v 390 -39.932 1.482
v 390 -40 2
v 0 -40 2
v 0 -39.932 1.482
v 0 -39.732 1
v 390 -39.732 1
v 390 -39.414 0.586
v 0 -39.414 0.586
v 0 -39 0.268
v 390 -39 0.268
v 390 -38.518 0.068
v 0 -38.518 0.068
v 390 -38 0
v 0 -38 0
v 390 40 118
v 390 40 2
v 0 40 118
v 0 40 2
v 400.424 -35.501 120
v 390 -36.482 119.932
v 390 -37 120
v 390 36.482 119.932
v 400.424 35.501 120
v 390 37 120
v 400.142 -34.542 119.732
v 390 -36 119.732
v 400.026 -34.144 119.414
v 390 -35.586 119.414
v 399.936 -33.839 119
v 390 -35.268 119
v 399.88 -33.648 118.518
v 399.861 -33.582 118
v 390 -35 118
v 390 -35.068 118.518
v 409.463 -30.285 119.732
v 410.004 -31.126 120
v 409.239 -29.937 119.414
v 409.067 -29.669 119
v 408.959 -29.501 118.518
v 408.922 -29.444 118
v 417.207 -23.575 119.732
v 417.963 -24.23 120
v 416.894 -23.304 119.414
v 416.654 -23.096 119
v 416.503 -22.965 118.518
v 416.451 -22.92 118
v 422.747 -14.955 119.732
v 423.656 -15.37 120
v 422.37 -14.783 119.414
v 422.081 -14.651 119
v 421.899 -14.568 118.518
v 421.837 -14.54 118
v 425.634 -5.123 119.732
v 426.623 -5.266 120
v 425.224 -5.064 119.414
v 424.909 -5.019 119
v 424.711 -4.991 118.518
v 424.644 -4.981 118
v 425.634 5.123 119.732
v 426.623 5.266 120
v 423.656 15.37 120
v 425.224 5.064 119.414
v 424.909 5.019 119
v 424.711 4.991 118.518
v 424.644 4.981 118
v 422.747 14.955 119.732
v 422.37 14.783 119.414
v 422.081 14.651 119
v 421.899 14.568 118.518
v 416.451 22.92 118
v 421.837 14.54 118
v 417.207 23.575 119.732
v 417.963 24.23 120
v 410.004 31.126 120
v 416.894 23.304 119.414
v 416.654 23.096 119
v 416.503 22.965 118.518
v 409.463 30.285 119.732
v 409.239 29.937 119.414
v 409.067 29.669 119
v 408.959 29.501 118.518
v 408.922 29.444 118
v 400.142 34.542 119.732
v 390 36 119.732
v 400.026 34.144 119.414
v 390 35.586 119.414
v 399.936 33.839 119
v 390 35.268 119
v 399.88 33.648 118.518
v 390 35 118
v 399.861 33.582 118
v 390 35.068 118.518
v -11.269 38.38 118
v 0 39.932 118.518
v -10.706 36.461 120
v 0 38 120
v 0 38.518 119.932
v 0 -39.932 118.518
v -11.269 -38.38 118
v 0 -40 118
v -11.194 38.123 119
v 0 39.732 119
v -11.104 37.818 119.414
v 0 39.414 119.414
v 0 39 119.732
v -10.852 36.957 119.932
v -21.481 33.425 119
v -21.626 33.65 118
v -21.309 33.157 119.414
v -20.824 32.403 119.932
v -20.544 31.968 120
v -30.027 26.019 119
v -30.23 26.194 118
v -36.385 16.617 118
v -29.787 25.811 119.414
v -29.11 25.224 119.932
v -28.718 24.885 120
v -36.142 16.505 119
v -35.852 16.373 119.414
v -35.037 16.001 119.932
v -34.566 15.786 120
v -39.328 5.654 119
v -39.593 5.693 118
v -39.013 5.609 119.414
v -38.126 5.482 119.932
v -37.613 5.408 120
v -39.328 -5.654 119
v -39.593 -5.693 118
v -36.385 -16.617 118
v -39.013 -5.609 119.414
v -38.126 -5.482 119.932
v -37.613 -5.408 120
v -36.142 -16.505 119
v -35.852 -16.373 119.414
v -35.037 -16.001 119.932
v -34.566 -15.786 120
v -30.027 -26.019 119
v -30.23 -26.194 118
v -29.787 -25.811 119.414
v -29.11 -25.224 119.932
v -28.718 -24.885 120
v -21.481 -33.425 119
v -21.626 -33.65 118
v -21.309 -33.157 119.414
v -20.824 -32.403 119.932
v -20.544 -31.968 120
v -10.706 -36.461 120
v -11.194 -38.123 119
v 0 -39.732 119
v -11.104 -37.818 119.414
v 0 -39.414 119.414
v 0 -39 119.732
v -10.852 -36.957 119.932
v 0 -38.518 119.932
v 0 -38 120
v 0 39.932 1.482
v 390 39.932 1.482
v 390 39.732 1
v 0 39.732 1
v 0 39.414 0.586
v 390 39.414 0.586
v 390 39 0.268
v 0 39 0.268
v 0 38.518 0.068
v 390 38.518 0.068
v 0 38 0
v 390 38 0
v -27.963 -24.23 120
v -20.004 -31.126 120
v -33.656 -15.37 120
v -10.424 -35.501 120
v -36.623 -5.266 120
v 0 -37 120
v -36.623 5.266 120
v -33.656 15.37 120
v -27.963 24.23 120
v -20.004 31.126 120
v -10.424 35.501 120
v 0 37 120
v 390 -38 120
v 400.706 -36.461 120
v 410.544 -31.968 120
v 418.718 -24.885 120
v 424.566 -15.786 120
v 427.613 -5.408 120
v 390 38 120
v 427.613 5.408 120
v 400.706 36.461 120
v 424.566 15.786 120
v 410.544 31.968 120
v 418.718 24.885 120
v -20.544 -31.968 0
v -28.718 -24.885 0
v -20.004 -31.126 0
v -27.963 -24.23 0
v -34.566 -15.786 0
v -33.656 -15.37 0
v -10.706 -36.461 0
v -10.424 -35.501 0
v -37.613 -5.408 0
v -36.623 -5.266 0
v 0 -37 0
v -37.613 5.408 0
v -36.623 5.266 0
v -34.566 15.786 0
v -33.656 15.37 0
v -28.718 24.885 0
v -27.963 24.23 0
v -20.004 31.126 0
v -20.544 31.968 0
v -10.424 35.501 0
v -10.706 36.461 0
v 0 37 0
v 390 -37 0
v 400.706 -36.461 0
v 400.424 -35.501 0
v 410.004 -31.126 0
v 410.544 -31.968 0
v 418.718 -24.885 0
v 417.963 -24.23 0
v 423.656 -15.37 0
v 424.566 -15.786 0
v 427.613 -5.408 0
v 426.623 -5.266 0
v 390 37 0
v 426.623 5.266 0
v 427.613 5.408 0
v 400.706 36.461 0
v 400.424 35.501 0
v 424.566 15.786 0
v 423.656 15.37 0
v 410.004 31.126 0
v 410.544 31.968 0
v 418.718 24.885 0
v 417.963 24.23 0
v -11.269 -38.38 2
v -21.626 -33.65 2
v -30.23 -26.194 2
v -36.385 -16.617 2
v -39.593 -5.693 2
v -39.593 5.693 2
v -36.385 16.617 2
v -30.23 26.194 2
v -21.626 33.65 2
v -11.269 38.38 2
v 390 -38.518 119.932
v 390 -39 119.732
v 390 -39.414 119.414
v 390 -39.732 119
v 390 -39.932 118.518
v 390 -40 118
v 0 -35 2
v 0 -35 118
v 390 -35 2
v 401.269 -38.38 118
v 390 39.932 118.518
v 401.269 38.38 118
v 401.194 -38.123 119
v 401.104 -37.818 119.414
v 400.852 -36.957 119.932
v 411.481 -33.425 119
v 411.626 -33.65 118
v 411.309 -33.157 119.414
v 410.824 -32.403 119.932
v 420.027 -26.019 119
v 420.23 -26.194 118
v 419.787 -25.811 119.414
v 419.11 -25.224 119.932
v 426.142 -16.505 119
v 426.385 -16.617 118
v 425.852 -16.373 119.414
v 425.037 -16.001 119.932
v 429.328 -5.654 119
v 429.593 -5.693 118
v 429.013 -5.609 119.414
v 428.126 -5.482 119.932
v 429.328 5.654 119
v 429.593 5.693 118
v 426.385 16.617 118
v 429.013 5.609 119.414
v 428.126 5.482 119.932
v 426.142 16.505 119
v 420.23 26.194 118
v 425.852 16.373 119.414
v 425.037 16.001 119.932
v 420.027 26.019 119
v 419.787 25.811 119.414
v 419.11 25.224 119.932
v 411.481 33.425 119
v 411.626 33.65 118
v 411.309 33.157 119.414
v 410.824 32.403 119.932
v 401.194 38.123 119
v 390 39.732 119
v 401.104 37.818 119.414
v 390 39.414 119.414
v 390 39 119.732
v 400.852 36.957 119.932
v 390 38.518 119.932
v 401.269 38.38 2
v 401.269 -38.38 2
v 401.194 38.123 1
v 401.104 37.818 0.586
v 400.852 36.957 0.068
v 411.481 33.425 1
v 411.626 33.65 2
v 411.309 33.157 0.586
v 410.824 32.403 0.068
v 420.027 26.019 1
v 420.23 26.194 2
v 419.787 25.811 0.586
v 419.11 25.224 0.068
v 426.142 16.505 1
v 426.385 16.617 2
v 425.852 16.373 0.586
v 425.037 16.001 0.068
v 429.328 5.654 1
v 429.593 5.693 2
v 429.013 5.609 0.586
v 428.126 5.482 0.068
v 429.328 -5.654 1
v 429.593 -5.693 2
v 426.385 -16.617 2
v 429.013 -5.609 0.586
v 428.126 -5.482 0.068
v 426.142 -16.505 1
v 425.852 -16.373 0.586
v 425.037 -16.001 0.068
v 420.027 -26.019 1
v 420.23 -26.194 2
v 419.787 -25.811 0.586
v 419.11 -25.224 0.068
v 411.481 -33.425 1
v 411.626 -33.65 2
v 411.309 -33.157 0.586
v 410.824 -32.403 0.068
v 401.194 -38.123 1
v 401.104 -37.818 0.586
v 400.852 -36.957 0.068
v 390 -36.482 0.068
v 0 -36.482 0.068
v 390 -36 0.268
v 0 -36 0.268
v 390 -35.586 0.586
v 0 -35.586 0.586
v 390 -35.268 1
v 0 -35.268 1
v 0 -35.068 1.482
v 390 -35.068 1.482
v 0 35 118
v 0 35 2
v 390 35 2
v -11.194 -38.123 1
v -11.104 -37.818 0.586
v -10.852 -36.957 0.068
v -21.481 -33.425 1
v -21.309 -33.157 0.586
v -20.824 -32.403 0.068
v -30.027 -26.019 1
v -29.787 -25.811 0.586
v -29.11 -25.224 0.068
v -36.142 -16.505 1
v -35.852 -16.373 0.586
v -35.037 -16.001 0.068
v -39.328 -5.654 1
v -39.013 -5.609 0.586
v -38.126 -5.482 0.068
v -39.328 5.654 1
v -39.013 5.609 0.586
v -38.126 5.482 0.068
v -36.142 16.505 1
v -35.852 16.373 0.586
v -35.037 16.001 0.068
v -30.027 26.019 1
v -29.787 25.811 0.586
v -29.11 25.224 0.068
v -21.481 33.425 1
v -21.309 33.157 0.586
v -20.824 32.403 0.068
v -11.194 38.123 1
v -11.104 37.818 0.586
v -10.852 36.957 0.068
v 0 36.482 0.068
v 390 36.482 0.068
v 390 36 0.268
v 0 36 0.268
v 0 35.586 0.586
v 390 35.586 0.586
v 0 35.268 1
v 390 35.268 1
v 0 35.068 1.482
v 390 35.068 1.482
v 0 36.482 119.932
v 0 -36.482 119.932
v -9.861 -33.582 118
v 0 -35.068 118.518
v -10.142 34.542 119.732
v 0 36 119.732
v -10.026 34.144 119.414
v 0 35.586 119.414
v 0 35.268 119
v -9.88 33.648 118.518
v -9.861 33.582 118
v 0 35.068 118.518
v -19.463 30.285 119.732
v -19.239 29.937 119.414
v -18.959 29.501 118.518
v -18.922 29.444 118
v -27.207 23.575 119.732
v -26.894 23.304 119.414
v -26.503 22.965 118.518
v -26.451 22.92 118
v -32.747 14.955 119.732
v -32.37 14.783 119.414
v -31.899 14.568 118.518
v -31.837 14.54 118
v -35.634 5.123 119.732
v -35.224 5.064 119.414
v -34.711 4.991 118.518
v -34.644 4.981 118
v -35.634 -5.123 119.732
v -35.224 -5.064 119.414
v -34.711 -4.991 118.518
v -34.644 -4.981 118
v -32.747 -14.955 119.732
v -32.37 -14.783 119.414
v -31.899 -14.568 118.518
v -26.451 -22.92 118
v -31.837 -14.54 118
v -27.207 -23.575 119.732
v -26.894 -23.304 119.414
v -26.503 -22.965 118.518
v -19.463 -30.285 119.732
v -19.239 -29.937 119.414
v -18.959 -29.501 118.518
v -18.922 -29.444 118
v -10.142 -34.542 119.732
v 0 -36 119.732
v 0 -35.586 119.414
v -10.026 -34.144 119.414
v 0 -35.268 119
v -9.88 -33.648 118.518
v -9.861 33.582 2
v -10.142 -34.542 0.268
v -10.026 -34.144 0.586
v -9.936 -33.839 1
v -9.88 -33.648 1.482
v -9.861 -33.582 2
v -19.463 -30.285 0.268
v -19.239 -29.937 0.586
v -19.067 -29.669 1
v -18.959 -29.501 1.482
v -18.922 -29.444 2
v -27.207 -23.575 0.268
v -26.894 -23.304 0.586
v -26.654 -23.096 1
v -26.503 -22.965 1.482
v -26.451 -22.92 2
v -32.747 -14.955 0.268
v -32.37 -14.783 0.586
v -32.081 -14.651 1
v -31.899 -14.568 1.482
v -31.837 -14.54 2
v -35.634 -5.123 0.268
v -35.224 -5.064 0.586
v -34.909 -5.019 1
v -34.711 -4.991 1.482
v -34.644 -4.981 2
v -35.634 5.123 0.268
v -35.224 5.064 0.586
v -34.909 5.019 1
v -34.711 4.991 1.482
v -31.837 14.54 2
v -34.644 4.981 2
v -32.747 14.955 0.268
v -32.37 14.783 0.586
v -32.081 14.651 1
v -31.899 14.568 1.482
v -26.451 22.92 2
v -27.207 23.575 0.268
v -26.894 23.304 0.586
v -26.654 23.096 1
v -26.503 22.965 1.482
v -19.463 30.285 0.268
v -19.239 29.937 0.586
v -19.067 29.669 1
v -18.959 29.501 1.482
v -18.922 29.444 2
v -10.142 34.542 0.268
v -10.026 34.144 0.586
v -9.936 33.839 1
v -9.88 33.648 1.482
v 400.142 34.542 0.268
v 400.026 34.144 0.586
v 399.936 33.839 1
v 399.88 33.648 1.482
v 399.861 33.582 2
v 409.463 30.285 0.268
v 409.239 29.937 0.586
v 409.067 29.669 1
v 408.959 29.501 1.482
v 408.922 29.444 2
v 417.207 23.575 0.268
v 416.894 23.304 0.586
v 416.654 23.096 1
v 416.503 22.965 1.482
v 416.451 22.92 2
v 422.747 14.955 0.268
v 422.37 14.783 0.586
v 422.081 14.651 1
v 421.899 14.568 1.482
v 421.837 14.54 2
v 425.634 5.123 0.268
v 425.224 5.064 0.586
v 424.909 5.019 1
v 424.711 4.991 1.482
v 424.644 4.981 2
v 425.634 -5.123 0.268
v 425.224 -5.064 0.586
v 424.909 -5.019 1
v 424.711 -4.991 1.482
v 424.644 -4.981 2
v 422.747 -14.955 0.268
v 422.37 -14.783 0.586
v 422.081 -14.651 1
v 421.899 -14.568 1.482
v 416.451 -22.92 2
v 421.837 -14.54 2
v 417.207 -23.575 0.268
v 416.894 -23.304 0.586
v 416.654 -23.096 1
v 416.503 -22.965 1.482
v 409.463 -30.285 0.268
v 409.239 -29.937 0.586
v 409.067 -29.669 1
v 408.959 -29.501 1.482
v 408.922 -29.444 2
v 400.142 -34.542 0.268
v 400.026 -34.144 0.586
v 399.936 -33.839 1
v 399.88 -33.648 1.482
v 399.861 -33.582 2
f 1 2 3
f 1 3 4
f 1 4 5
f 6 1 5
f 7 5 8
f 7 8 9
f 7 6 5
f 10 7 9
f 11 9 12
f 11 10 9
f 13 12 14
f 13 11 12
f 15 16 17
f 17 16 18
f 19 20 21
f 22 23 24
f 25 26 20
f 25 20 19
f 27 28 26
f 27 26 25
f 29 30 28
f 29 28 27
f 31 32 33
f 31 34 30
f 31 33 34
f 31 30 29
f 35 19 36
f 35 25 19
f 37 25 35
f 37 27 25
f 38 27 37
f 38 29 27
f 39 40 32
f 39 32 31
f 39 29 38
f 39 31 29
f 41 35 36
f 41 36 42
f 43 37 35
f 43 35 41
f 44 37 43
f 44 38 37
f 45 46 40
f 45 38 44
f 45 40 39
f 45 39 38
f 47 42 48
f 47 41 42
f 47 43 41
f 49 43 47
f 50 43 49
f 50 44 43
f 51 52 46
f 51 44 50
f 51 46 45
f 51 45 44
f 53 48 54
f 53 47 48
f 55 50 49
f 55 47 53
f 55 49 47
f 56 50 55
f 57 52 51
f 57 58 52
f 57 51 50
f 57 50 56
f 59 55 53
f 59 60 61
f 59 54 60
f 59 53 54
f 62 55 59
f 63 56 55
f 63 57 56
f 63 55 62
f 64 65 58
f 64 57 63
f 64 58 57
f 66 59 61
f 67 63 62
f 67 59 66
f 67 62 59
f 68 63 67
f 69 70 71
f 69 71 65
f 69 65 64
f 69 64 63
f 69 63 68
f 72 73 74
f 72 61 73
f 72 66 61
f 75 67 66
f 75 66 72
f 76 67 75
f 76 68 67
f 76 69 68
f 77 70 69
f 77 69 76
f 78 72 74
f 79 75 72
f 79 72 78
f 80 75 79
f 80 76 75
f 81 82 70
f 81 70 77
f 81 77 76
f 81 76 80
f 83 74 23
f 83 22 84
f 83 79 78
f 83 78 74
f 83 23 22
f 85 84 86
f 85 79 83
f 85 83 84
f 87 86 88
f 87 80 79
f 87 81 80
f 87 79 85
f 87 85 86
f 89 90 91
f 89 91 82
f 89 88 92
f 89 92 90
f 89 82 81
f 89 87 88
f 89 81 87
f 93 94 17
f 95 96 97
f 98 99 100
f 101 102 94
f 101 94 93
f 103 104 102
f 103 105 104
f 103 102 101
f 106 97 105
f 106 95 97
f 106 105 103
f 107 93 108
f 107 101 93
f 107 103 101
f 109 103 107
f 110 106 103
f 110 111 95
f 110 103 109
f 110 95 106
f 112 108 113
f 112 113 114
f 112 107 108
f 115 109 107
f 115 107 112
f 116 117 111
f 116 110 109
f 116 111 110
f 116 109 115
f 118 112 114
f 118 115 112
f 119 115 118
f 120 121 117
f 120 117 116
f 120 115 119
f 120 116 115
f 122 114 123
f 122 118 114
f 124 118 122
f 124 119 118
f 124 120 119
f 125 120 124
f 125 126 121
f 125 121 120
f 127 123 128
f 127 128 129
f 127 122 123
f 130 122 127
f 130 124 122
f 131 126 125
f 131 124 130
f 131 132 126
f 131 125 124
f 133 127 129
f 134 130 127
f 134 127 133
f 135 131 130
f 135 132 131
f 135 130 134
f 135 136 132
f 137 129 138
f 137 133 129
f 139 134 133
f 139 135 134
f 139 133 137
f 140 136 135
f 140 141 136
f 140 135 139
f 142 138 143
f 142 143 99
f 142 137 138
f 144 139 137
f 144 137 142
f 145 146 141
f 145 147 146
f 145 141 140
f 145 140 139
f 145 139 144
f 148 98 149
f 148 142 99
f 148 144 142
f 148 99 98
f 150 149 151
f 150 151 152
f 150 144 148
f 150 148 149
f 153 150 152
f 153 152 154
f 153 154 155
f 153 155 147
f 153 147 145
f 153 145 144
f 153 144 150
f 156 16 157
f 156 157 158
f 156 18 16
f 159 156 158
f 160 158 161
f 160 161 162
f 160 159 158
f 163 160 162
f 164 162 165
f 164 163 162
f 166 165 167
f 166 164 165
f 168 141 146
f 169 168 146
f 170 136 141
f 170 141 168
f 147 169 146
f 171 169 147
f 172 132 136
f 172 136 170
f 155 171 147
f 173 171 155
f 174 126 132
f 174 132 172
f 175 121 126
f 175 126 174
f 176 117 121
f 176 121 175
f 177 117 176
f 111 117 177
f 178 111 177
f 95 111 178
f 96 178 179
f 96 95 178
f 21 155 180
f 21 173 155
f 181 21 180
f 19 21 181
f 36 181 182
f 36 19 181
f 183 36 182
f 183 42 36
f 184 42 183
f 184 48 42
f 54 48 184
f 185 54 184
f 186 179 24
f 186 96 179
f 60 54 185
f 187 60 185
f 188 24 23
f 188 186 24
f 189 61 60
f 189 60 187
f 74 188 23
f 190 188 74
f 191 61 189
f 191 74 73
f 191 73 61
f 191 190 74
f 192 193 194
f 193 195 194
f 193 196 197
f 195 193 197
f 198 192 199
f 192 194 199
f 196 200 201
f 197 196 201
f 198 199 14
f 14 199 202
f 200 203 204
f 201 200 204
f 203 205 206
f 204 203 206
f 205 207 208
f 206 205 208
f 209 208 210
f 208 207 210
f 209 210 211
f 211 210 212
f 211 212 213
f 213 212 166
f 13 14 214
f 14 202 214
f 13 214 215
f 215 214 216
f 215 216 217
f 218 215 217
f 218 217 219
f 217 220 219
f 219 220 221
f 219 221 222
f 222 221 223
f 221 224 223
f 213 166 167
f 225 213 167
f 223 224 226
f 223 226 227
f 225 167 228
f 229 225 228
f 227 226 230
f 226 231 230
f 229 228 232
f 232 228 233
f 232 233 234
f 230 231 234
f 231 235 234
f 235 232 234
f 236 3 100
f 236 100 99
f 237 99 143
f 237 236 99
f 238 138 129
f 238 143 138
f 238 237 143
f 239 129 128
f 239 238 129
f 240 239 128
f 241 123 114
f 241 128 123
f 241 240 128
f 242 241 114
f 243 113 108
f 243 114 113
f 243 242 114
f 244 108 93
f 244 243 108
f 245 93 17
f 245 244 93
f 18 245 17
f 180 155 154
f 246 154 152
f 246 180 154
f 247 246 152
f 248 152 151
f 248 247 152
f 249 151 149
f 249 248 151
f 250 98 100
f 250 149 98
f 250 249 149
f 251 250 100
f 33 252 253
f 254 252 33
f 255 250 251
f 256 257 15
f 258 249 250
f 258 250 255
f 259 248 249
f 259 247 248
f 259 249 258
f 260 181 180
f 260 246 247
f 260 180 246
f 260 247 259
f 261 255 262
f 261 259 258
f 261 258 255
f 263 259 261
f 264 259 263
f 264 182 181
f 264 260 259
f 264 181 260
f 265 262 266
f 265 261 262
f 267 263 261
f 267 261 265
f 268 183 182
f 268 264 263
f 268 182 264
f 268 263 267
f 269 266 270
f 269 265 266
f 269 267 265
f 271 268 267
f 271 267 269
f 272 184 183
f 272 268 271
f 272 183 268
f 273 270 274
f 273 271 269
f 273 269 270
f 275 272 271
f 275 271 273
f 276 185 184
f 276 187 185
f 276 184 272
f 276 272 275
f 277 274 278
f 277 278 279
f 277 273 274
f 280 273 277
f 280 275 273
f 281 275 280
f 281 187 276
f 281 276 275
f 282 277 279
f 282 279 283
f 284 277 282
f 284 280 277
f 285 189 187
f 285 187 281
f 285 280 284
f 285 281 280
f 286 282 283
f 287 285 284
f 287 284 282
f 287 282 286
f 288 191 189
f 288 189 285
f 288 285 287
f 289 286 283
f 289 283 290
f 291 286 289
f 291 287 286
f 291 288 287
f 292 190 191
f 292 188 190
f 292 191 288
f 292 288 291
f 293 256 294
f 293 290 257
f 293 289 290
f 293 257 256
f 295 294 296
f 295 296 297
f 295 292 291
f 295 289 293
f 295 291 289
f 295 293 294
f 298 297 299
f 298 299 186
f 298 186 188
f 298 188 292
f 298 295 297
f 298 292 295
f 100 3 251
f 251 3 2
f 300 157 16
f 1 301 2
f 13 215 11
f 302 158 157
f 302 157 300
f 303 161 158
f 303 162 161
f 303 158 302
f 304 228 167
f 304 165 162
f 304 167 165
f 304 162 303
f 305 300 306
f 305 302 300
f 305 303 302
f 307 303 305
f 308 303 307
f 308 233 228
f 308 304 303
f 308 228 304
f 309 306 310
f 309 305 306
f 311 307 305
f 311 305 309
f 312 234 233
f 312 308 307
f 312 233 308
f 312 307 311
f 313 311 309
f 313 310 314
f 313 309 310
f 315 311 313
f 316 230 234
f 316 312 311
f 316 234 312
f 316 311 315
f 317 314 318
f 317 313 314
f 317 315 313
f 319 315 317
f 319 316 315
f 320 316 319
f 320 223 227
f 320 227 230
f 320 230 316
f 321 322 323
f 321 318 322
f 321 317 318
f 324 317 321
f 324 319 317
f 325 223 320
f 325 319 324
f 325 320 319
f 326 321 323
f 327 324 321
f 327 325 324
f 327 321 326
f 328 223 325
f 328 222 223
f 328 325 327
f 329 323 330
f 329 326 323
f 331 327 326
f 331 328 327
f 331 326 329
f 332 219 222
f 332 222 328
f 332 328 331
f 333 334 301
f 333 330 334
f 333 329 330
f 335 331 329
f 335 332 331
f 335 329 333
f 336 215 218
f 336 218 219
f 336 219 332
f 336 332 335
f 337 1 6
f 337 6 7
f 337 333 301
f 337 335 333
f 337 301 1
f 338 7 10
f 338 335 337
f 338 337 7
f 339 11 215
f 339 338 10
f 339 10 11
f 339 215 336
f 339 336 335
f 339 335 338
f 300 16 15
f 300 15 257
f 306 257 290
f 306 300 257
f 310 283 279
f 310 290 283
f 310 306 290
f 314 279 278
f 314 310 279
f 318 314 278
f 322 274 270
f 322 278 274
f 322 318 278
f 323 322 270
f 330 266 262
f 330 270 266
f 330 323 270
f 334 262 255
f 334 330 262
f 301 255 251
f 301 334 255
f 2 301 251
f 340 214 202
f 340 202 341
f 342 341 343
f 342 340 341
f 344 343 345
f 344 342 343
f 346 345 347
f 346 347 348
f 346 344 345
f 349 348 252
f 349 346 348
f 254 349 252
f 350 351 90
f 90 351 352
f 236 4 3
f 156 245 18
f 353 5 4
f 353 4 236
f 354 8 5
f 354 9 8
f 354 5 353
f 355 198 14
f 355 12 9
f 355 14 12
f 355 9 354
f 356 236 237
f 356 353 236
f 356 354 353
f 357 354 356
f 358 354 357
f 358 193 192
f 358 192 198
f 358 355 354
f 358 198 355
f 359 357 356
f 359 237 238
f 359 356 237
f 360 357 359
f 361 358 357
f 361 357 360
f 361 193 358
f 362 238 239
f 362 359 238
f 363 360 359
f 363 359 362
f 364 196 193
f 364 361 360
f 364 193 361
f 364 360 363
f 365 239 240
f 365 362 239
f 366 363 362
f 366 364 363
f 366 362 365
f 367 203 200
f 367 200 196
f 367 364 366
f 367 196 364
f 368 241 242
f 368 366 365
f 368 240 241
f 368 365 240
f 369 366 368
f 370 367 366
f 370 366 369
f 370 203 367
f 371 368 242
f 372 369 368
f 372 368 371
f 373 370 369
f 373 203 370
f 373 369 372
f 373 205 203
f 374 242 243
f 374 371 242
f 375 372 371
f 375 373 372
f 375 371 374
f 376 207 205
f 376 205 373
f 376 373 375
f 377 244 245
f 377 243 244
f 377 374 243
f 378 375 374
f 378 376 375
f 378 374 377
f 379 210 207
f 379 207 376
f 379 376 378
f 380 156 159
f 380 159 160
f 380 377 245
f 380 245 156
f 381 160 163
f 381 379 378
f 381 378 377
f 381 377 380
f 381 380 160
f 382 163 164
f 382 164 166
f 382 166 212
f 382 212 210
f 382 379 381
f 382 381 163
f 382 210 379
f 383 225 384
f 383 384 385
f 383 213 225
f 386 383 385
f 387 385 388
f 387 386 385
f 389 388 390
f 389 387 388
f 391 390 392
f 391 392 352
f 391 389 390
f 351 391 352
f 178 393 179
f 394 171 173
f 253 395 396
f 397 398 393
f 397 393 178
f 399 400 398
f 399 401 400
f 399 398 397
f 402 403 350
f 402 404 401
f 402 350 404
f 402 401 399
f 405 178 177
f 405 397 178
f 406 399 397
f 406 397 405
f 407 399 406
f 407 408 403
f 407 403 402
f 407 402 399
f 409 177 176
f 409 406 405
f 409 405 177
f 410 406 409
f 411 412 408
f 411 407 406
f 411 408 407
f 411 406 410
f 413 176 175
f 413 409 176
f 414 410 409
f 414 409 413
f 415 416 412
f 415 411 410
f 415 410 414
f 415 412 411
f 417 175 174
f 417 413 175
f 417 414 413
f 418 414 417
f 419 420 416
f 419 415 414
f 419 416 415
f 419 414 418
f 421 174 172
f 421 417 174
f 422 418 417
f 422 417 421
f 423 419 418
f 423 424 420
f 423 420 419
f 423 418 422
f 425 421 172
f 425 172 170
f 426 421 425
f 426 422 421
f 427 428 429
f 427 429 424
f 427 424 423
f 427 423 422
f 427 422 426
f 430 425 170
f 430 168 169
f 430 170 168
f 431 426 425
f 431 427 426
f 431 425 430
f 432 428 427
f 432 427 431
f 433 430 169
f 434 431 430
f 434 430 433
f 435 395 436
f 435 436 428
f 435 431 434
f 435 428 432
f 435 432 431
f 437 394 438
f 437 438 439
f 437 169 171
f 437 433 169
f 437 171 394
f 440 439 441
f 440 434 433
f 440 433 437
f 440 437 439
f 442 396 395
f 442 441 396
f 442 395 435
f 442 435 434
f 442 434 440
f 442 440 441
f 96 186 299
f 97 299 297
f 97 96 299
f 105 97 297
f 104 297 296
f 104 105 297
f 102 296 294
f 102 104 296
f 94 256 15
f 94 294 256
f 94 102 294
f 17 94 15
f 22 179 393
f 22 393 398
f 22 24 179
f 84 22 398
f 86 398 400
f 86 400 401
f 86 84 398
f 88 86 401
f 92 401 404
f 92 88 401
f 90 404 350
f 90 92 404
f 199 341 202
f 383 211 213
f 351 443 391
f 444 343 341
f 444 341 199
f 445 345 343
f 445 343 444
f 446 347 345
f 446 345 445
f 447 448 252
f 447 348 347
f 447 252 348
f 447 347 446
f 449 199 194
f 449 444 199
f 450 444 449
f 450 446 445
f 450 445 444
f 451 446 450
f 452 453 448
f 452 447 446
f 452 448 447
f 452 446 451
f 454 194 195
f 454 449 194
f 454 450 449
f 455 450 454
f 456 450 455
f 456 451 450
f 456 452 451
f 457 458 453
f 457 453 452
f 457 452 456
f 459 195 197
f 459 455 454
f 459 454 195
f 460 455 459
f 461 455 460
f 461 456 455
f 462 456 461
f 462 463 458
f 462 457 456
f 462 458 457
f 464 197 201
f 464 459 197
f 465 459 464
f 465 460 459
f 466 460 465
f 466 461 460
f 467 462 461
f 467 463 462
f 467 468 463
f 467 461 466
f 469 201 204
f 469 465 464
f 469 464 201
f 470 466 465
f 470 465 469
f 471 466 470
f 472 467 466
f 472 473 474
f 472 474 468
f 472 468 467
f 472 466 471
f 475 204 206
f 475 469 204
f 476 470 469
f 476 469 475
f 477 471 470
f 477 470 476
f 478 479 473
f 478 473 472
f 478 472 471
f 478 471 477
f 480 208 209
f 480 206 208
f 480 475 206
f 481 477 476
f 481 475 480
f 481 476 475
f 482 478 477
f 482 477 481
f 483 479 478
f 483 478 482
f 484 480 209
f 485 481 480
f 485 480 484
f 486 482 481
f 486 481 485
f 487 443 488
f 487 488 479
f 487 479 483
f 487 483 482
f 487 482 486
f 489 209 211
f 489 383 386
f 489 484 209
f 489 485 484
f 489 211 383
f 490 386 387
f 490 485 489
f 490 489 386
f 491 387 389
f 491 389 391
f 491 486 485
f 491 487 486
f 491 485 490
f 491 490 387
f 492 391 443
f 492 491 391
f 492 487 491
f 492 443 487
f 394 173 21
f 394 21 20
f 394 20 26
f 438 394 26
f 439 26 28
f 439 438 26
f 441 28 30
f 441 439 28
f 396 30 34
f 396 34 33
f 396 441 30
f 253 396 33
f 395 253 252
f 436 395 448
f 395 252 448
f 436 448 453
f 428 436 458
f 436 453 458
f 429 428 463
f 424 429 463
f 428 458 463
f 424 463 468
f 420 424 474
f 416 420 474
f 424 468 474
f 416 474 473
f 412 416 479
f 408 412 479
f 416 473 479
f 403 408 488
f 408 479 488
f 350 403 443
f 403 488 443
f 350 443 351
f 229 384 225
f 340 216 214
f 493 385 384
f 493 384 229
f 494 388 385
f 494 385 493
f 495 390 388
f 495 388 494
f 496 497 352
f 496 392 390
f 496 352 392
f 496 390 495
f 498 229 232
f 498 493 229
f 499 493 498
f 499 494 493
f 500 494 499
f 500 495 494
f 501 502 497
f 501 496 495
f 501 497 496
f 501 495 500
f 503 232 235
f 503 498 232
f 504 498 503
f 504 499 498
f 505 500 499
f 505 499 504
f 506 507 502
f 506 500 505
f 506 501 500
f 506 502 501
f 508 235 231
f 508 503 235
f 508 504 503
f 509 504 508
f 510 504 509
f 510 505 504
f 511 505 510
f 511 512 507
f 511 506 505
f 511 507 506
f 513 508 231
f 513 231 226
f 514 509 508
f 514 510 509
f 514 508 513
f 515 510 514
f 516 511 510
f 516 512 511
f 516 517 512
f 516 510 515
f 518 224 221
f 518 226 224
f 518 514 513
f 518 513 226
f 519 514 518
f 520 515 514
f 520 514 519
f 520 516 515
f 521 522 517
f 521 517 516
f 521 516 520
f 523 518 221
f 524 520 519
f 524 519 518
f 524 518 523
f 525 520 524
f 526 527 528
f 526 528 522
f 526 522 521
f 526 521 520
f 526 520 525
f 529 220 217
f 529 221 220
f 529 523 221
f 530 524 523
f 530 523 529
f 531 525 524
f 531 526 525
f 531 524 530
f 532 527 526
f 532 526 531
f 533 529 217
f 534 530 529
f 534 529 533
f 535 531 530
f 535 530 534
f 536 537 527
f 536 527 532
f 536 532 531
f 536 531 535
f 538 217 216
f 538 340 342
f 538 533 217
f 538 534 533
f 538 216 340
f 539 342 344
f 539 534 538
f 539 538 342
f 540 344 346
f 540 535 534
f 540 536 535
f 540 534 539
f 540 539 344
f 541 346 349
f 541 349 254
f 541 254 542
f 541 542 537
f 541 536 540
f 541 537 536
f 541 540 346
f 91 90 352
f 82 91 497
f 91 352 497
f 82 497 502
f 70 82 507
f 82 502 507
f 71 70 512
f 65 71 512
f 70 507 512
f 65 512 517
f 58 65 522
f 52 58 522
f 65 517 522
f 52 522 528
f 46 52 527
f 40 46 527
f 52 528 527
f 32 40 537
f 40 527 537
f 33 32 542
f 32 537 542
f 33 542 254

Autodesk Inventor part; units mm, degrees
ref_plane "YZ Plane" through (0, 0, 0) normal (1, 0, 0) x (0, 1, 0)
ref_plane "XZ Plane" through (0, 0, 0) normal (0, 1, 0) x (-1, 0, 0)
ref_plane "XY Plane" through (0, 0, 0) normal (0, 0, 1) x (1, 0, 0)
sketch "Szkic1" plane through (0, 0, 0) normal (0, 0, 1) x (1, 0, 0)
  arc A0 (0, 35) -> (0, -35) centre (0, 0) ccw
  line L0 (0, 35) -> (390, 35)
  arc A1 (390, -35) -> (390, 35) centre (390, 0) ccw
  line L1 (0, -35) -> (390, -35)
  line L2 (390, 40) -> (0, 40)
  arc A2 (0, 40) -> (0, -40) centre (0, 0) ccw
  line L3 (0, -40) -> (390, -40)
  arc A3 (390, -40) -> (390, 40) centre (390, 0) ccw
  point P0 (424.991, -0.7958)
  dimension "d0" = 70
  dimension "d1" = 390
  dimension "d2" = 70
  dimension "d3" = 5
extrude "Wyciągnięcie proste1" add sketch "Szkic1" along normal blind 120
fillet "Zaokrąglenie1" radius 2 4 edges at (-40, 0, 120) (195, -40, 120) (430, 0, 120) (195, 40, 120)
fillet "Zaokrąglenie2" radius 2 4 edges at (195, 35, 120) (425, 0, 120) (195, -35, 120) (-35, 0, 120)
fillet "Zaokrąglenie3" radius 2 4 edges at (-40, 0, 0) (195, -40, 0) (430, 0, 0) (195, 40, 0)
fillet "Zaokrąglenie4" radius 2 4 edges at (425, 0, 0) (195, -35, 0) (-35, 0, 0) (195, 35, 0)
properties part number "pastran"
